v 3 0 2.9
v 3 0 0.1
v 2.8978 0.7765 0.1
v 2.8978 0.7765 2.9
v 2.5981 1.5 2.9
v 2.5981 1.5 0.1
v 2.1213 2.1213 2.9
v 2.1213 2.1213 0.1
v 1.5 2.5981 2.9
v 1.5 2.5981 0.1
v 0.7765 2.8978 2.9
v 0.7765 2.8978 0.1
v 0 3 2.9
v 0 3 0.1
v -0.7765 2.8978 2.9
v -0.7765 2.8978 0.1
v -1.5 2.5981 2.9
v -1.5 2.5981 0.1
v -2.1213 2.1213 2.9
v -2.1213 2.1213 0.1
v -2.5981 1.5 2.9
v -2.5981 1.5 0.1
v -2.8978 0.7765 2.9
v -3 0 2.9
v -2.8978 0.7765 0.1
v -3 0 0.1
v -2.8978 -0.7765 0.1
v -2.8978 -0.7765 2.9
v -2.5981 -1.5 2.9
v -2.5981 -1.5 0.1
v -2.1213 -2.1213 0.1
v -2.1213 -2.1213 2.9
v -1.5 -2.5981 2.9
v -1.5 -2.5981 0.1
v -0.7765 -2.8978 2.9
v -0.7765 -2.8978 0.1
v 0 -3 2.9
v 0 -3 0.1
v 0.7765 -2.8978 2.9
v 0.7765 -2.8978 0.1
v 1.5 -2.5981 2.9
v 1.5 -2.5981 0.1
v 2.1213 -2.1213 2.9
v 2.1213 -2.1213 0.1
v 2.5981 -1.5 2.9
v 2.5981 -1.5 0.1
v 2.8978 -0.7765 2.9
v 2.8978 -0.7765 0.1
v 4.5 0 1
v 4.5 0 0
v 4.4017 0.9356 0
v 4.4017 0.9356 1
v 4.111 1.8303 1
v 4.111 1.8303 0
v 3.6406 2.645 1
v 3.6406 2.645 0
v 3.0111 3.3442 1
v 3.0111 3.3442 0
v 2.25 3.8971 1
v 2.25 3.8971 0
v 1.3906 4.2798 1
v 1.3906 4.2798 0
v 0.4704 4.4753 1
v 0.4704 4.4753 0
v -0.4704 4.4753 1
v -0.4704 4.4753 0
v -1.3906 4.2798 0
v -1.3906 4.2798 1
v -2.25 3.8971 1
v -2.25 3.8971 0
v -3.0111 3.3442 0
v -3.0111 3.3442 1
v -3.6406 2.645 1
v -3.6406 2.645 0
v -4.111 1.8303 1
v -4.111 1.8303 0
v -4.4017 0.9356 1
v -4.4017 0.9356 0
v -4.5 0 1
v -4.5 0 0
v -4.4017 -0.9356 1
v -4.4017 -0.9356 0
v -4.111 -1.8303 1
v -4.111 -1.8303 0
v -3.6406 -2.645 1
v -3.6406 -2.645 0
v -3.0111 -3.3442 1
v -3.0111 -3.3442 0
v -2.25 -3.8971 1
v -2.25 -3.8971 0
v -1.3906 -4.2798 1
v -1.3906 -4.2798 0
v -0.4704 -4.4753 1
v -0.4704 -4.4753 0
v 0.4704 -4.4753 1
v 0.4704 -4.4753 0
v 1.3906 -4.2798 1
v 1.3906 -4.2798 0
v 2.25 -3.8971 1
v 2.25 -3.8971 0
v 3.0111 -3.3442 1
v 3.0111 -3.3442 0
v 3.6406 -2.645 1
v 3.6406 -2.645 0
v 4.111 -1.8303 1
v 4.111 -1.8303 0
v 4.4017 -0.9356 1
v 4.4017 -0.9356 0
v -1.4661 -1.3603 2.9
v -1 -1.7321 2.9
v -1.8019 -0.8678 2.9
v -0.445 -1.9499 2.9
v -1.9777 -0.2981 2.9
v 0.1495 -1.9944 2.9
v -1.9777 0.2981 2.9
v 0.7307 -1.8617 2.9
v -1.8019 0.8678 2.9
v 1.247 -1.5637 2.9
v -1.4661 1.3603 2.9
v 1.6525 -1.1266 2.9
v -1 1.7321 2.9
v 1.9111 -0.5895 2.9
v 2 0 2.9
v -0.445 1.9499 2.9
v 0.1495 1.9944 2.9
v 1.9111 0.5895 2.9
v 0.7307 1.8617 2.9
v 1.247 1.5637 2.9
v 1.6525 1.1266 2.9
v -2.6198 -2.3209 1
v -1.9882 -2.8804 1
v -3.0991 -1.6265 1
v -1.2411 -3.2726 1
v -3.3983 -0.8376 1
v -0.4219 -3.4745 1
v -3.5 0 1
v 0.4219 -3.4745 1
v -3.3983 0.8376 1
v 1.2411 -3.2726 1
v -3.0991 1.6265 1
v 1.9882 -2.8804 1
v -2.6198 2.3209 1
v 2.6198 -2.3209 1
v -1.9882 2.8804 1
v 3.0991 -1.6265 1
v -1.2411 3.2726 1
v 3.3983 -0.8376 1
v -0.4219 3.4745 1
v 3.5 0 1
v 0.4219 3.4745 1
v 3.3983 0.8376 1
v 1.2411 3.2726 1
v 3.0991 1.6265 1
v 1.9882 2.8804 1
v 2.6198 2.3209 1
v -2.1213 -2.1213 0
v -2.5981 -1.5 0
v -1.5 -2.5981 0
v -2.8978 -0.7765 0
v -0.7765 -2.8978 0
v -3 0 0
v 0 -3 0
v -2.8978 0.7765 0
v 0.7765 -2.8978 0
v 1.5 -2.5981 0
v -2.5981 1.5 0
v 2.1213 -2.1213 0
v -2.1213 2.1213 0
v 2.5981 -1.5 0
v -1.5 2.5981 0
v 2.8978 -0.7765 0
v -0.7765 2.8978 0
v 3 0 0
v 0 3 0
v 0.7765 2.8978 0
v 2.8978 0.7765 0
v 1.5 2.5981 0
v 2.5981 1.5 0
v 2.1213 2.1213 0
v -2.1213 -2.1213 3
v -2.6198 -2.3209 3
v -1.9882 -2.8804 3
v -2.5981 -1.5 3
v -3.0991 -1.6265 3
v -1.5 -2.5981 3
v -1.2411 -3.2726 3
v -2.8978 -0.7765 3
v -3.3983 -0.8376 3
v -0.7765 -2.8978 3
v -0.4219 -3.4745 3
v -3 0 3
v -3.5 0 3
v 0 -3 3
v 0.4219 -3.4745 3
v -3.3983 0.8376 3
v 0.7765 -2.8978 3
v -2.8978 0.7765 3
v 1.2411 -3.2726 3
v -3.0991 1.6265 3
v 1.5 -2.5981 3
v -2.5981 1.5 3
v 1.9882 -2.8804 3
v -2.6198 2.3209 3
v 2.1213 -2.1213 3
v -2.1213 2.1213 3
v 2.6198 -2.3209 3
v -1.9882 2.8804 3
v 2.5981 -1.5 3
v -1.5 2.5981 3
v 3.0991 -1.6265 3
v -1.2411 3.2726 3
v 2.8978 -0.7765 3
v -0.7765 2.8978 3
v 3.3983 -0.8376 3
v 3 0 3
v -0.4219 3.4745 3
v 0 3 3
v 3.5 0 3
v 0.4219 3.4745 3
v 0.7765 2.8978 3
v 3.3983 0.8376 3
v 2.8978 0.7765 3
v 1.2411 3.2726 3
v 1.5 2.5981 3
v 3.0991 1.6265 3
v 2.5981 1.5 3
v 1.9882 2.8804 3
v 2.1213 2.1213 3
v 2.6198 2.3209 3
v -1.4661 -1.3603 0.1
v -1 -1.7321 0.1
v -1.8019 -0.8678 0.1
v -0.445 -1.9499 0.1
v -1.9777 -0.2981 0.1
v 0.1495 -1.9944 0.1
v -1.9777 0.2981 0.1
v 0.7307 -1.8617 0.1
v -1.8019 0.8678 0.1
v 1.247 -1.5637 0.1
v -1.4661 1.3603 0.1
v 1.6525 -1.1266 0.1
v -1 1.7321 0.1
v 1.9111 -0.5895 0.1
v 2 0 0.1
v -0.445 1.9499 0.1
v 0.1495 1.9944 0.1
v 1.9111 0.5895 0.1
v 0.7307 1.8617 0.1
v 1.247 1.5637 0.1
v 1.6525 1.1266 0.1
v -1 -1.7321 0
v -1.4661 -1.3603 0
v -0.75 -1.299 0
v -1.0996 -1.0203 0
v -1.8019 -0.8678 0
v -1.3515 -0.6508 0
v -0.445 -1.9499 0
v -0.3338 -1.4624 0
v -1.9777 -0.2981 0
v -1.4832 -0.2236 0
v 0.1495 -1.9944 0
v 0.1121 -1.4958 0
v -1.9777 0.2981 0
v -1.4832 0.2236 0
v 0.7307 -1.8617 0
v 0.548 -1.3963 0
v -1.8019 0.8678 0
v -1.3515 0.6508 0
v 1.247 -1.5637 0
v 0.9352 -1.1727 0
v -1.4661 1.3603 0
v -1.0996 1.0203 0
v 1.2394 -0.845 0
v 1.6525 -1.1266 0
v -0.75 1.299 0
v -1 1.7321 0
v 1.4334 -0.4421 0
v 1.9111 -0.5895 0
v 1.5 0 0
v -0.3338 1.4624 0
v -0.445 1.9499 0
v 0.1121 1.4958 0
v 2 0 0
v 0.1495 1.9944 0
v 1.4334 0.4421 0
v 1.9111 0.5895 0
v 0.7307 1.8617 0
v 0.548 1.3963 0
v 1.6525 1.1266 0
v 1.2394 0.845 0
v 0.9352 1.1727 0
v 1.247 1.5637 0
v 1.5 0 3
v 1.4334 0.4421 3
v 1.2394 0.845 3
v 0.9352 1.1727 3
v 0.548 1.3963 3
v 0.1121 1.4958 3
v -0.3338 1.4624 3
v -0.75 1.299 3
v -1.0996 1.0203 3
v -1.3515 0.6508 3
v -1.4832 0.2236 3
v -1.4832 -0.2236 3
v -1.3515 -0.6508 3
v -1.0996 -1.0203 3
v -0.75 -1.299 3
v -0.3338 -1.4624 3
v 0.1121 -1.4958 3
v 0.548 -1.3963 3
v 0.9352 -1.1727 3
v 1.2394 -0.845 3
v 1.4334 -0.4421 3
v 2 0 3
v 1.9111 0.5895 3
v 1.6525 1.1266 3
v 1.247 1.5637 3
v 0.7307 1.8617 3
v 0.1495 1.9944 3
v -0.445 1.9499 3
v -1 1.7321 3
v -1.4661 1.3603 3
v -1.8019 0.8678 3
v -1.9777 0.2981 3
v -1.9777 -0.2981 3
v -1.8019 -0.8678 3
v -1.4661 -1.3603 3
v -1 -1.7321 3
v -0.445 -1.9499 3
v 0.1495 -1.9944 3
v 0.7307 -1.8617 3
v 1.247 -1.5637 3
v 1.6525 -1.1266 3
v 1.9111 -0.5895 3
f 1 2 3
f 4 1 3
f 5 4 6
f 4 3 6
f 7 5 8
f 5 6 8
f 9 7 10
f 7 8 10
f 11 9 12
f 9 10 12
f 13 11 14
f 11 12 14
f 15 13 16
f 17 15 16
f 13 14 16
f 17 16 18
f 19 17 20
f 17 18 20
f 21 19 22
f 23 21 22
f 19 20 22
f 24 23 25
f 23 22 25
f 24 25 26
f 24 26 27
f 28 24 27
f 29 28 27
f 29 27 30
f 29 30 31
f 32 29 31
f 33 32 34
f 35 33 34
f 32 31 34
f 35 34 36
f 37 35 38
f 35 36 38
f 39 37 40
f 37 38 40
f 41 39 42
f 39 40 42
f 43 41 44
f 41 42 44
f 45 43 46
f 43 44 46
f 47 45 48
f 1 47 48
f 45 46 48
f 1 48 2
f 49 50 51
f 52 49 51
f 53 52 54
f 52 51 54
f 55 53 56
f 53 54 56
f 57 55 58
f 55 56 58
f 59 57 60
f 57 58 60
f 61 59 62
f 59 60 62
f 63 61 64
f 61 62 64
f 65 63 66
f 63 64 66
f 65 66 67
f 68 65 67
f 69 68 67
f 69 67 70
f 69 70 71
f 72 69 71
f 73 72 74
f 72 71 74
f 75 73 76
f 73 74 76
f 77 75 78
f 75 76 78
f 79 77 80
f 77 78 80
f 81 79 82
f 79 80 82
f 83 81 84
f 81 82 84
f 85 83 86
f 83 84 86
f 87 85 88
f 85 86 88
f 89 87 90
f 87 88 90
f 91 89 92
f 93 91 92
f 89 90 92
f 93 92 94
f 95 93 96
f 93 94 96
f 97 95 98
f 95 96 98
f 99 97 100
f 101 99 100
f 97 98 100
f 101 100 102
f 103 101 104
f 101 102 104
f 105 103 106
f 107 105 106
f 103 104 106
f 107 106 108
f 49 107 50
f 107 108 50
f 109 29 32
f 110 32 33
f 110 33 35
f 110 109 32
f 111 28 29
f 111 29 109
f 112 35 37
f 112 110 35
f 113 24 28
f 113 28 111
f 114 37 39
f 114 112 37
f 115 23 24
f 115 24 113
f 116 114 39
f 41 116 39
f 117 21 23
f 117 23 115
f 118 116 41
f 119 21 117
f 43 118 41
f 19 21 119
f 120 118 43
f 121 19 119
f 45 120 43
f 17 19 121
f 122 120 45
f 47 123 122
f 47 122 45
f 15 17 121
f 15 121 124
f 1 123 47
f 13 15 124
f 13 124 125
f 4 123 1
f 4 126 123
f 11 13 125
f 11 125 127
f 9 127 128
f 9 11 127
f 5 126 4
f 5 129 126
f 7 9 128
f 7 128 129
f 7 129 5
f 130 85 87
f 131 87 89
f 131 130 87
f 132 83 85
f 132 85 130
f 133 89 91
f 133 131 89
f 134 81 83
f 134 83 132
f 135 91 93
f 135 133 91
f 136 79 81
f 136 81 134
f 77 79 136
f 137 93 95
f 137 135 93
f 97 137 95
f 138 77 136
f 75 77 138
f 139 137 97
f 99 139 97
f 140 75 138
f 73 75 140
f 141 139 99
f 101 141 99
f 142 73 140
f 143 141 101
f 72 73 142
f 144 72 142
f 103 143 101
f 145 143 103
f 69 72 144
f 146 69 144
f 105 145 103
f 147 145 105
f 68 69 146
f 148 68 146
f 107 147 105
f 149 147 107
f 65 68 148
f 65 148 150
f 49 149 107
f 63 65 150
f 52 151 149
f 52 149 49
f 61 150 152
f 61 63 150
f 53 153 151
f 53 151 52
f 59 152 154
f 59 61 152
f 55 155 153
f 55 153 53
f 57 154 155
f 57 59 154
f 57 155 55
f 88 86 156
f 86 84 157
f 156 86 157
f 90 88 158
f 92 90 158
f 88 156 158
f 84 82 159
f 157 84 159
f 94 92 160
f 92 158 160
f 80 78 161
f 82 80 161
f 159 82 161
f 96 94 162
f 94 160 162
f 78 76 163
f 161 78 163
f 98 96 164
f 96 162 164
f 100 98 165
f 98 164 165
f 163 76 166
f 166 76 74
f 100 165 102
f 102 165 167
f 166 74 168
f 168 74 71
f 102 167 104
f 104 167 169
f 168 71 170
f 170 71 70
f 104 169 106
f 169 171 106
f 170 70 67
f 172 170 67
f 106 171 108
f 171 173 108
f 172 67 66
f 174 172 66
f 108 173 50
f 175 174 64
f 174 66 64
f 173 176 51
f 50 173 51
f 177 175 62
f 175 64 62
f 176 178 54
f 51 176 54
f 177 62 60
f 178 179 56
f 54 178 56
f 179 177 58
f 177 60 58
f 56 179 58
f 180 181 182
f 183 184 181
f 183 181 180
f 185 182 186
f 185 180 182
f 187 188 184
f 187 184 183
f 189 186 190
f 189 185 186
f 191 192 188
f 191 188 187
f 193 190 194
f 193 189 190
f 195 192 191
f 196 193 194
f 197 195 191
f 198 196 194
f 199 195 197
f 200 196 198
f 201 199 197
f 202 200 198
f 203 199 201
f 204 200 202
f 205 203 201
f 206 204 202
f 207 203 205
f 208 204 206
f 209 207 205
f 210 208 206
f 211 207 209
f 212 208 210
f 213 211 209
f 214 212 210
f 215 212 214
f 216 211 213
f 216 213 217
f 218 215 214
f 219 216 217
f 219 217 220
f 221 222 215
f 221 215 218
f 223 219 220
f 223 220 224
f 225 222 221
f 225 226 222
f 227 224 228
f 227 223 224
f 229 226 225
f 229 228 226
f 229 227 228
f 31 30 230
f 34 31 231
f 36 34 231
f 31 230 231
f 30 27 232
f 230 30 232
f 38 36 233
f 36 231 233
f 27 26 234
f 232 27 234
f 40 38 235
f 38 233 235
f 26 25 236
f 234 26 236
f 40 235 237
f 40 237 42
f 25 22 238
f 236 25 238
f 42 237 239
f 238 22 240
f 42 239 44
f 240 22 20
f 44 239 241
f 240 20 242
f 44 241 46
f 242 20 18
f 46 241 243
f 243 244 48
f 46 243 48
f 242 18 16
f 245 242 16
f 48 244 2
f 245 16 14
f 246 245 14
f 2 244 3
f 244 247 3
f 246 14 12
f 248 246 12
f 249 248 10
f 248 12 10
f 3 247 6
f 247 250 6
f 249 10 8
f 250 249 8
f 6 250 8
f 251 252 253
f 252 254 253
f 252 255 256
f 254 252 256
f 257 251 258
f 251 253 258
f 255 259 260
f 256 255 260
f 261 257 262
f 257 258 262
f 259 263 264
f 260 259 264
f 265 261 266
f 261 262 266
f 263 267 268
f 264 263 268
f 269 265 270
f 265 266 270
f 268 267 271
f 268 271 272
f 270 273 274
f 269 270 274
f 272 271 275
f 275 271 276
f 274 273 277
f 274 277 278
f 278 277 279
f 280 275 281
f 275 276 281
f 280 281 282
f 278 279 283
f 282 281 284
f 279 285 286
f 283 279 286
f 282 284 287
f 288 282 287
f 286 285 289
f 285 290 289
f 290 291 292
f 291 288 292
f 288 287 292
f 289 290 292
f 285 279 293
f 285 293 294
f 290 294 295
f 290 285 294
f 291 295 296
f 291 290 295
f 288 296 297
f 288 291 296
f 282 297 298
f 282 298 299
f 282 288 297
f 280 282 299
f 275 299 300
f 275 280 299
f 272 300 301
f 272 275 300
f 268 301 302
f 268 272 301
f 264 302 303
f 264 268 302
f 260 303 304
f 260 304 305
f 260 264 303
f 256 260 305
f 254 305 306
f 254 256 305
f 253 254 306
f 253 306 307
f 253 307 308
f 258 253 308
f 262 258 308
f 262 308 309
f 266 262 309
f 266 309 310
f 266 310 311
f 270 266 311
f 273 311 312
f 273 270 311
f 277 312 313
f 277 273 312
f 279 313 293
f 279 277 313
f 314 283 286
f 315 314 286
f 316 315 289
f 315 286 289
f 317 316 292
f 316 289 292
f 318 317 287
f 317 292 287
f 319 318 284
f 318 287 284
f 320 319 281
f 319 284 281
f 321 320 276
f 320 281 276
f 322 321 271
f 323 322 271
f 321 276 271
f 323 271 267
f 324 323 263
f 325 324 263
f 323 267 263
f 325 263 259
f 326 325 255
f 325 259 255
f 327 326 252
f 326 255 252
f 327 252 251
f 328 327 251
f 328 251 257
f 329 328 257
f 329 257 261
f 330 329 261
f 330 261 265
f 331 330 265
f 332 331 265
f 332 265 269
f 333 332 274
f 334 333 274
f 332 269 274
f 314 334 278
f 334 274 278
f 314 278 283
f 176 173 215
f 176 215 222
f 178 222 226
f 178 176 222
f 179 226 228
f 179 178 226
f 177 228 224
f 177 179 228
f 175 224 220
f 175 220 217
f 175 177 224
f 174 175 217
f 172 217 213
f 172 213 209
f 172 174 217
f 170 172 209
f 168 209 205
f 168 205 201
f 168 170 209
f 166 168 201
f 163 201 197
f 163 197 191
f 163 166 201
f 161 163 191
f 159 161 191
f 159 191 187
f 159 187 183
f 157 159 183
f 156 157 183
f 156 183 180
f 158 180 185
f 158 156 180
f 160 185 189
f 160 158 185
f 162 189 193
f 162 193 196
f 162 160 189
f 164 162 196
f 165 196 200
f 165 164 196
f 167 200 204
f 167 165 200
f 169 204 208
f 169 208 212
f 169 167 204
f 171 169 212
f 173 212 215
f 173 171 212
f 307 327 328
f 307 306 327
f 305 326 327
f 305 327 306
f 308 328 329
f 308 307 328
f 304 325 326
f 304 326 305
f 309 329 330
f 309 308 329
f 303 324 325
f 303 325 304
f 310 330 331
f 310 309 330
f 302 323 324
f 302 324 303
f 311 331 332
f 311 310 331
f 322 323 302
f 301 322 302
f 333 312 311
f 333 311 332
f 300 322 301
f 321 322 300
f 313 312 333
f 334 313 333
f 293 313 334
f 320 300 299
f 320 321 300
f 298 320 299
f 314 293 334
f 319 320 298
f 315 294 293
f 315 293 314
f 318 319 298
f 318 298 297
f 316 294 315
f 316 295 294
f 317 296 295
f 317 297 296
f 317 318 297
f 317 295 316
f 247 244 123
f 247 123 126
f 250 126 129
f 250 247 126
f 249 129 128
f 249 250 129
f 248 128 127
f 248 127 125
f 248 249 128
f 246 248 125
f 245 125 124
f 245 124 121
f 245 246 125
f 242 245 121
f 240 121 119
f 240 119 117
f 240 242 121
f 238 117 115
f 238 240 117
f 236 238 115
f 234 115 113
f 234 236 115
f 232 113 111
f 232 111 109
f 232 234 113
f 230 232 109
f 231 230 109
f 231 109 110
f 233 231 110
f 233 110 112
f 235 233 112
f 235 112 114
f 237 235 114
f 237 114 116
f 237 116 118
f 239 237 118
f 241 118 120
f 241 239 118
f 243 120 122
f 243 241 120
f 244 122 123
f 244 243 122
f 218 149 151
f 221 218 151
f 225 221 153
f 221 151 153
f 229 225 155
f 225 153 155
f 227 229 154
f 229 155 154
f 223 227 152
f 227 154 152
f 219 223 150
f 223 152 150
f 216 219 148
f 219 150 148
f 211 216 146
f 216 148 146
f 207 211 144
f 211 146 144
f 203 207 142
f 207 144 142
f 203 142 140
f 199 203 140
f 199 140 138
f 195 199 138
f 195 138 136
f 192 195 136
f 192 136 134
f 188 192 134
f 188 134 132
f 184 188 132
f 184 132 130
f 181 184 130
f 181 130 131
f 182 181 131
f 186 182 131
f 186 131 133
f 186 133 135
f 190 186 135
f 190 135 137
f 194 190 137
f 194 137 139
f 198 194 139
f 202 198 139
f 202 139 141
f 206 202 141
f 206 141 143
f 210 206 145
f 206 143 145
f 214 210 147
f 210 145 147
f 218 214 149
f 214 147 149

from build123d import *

# Parameters (mm, degrees)
F0_R     = 4.5
F0_R_2   = 3.5
F1_DEPTH = 1
F0_R_3   = 2
F0_R_4   = 1.5
F2_DEPTH = 3
F0_R_5   = 3
F3_START = 0.1
F3_DEPTH = 2.8


with BuildPart() as f1:
    # F0 (on Top) → F1 (new body)
    with BuildSketch(Plane.XY):
        Circle(F0_R)
        Circle(F0_R_2, mode=Mode.SUBTRACT)
    extrude(amount=F1_DEPTH)

    # F0 (on Top) → F2, piece 2 (join)
    with BuildSketch(Plane.XY):
        Circle(F0_R_2)
        Circle(F0_R_5, mode=Mode.SUBTRACT)
    extrude(amount=F2_DEPTH)


with BuildPart() as f2:
    # F0 (on Top) → F2 (new body)
    with BuildSketch(Plane.XY):
        Circle(F0_R_3)
        Circle(F0_R_4, mode=Mode.SUBTRACT)
    extrude(amount=F2_DEPTH)


with BuildPart() as f3:
    # F0 (on Top) → F3 (new body)
    with BuildSketch(Plane.XY.offset(F3_START)):
        Circle(F0_R_5)
        Circle(F0_R_3, mode=Mode.SUBTRACT)
    extrude(amount=F3_DEPTH)


solid = Compound([f1.part, f2.part, f3.part])
